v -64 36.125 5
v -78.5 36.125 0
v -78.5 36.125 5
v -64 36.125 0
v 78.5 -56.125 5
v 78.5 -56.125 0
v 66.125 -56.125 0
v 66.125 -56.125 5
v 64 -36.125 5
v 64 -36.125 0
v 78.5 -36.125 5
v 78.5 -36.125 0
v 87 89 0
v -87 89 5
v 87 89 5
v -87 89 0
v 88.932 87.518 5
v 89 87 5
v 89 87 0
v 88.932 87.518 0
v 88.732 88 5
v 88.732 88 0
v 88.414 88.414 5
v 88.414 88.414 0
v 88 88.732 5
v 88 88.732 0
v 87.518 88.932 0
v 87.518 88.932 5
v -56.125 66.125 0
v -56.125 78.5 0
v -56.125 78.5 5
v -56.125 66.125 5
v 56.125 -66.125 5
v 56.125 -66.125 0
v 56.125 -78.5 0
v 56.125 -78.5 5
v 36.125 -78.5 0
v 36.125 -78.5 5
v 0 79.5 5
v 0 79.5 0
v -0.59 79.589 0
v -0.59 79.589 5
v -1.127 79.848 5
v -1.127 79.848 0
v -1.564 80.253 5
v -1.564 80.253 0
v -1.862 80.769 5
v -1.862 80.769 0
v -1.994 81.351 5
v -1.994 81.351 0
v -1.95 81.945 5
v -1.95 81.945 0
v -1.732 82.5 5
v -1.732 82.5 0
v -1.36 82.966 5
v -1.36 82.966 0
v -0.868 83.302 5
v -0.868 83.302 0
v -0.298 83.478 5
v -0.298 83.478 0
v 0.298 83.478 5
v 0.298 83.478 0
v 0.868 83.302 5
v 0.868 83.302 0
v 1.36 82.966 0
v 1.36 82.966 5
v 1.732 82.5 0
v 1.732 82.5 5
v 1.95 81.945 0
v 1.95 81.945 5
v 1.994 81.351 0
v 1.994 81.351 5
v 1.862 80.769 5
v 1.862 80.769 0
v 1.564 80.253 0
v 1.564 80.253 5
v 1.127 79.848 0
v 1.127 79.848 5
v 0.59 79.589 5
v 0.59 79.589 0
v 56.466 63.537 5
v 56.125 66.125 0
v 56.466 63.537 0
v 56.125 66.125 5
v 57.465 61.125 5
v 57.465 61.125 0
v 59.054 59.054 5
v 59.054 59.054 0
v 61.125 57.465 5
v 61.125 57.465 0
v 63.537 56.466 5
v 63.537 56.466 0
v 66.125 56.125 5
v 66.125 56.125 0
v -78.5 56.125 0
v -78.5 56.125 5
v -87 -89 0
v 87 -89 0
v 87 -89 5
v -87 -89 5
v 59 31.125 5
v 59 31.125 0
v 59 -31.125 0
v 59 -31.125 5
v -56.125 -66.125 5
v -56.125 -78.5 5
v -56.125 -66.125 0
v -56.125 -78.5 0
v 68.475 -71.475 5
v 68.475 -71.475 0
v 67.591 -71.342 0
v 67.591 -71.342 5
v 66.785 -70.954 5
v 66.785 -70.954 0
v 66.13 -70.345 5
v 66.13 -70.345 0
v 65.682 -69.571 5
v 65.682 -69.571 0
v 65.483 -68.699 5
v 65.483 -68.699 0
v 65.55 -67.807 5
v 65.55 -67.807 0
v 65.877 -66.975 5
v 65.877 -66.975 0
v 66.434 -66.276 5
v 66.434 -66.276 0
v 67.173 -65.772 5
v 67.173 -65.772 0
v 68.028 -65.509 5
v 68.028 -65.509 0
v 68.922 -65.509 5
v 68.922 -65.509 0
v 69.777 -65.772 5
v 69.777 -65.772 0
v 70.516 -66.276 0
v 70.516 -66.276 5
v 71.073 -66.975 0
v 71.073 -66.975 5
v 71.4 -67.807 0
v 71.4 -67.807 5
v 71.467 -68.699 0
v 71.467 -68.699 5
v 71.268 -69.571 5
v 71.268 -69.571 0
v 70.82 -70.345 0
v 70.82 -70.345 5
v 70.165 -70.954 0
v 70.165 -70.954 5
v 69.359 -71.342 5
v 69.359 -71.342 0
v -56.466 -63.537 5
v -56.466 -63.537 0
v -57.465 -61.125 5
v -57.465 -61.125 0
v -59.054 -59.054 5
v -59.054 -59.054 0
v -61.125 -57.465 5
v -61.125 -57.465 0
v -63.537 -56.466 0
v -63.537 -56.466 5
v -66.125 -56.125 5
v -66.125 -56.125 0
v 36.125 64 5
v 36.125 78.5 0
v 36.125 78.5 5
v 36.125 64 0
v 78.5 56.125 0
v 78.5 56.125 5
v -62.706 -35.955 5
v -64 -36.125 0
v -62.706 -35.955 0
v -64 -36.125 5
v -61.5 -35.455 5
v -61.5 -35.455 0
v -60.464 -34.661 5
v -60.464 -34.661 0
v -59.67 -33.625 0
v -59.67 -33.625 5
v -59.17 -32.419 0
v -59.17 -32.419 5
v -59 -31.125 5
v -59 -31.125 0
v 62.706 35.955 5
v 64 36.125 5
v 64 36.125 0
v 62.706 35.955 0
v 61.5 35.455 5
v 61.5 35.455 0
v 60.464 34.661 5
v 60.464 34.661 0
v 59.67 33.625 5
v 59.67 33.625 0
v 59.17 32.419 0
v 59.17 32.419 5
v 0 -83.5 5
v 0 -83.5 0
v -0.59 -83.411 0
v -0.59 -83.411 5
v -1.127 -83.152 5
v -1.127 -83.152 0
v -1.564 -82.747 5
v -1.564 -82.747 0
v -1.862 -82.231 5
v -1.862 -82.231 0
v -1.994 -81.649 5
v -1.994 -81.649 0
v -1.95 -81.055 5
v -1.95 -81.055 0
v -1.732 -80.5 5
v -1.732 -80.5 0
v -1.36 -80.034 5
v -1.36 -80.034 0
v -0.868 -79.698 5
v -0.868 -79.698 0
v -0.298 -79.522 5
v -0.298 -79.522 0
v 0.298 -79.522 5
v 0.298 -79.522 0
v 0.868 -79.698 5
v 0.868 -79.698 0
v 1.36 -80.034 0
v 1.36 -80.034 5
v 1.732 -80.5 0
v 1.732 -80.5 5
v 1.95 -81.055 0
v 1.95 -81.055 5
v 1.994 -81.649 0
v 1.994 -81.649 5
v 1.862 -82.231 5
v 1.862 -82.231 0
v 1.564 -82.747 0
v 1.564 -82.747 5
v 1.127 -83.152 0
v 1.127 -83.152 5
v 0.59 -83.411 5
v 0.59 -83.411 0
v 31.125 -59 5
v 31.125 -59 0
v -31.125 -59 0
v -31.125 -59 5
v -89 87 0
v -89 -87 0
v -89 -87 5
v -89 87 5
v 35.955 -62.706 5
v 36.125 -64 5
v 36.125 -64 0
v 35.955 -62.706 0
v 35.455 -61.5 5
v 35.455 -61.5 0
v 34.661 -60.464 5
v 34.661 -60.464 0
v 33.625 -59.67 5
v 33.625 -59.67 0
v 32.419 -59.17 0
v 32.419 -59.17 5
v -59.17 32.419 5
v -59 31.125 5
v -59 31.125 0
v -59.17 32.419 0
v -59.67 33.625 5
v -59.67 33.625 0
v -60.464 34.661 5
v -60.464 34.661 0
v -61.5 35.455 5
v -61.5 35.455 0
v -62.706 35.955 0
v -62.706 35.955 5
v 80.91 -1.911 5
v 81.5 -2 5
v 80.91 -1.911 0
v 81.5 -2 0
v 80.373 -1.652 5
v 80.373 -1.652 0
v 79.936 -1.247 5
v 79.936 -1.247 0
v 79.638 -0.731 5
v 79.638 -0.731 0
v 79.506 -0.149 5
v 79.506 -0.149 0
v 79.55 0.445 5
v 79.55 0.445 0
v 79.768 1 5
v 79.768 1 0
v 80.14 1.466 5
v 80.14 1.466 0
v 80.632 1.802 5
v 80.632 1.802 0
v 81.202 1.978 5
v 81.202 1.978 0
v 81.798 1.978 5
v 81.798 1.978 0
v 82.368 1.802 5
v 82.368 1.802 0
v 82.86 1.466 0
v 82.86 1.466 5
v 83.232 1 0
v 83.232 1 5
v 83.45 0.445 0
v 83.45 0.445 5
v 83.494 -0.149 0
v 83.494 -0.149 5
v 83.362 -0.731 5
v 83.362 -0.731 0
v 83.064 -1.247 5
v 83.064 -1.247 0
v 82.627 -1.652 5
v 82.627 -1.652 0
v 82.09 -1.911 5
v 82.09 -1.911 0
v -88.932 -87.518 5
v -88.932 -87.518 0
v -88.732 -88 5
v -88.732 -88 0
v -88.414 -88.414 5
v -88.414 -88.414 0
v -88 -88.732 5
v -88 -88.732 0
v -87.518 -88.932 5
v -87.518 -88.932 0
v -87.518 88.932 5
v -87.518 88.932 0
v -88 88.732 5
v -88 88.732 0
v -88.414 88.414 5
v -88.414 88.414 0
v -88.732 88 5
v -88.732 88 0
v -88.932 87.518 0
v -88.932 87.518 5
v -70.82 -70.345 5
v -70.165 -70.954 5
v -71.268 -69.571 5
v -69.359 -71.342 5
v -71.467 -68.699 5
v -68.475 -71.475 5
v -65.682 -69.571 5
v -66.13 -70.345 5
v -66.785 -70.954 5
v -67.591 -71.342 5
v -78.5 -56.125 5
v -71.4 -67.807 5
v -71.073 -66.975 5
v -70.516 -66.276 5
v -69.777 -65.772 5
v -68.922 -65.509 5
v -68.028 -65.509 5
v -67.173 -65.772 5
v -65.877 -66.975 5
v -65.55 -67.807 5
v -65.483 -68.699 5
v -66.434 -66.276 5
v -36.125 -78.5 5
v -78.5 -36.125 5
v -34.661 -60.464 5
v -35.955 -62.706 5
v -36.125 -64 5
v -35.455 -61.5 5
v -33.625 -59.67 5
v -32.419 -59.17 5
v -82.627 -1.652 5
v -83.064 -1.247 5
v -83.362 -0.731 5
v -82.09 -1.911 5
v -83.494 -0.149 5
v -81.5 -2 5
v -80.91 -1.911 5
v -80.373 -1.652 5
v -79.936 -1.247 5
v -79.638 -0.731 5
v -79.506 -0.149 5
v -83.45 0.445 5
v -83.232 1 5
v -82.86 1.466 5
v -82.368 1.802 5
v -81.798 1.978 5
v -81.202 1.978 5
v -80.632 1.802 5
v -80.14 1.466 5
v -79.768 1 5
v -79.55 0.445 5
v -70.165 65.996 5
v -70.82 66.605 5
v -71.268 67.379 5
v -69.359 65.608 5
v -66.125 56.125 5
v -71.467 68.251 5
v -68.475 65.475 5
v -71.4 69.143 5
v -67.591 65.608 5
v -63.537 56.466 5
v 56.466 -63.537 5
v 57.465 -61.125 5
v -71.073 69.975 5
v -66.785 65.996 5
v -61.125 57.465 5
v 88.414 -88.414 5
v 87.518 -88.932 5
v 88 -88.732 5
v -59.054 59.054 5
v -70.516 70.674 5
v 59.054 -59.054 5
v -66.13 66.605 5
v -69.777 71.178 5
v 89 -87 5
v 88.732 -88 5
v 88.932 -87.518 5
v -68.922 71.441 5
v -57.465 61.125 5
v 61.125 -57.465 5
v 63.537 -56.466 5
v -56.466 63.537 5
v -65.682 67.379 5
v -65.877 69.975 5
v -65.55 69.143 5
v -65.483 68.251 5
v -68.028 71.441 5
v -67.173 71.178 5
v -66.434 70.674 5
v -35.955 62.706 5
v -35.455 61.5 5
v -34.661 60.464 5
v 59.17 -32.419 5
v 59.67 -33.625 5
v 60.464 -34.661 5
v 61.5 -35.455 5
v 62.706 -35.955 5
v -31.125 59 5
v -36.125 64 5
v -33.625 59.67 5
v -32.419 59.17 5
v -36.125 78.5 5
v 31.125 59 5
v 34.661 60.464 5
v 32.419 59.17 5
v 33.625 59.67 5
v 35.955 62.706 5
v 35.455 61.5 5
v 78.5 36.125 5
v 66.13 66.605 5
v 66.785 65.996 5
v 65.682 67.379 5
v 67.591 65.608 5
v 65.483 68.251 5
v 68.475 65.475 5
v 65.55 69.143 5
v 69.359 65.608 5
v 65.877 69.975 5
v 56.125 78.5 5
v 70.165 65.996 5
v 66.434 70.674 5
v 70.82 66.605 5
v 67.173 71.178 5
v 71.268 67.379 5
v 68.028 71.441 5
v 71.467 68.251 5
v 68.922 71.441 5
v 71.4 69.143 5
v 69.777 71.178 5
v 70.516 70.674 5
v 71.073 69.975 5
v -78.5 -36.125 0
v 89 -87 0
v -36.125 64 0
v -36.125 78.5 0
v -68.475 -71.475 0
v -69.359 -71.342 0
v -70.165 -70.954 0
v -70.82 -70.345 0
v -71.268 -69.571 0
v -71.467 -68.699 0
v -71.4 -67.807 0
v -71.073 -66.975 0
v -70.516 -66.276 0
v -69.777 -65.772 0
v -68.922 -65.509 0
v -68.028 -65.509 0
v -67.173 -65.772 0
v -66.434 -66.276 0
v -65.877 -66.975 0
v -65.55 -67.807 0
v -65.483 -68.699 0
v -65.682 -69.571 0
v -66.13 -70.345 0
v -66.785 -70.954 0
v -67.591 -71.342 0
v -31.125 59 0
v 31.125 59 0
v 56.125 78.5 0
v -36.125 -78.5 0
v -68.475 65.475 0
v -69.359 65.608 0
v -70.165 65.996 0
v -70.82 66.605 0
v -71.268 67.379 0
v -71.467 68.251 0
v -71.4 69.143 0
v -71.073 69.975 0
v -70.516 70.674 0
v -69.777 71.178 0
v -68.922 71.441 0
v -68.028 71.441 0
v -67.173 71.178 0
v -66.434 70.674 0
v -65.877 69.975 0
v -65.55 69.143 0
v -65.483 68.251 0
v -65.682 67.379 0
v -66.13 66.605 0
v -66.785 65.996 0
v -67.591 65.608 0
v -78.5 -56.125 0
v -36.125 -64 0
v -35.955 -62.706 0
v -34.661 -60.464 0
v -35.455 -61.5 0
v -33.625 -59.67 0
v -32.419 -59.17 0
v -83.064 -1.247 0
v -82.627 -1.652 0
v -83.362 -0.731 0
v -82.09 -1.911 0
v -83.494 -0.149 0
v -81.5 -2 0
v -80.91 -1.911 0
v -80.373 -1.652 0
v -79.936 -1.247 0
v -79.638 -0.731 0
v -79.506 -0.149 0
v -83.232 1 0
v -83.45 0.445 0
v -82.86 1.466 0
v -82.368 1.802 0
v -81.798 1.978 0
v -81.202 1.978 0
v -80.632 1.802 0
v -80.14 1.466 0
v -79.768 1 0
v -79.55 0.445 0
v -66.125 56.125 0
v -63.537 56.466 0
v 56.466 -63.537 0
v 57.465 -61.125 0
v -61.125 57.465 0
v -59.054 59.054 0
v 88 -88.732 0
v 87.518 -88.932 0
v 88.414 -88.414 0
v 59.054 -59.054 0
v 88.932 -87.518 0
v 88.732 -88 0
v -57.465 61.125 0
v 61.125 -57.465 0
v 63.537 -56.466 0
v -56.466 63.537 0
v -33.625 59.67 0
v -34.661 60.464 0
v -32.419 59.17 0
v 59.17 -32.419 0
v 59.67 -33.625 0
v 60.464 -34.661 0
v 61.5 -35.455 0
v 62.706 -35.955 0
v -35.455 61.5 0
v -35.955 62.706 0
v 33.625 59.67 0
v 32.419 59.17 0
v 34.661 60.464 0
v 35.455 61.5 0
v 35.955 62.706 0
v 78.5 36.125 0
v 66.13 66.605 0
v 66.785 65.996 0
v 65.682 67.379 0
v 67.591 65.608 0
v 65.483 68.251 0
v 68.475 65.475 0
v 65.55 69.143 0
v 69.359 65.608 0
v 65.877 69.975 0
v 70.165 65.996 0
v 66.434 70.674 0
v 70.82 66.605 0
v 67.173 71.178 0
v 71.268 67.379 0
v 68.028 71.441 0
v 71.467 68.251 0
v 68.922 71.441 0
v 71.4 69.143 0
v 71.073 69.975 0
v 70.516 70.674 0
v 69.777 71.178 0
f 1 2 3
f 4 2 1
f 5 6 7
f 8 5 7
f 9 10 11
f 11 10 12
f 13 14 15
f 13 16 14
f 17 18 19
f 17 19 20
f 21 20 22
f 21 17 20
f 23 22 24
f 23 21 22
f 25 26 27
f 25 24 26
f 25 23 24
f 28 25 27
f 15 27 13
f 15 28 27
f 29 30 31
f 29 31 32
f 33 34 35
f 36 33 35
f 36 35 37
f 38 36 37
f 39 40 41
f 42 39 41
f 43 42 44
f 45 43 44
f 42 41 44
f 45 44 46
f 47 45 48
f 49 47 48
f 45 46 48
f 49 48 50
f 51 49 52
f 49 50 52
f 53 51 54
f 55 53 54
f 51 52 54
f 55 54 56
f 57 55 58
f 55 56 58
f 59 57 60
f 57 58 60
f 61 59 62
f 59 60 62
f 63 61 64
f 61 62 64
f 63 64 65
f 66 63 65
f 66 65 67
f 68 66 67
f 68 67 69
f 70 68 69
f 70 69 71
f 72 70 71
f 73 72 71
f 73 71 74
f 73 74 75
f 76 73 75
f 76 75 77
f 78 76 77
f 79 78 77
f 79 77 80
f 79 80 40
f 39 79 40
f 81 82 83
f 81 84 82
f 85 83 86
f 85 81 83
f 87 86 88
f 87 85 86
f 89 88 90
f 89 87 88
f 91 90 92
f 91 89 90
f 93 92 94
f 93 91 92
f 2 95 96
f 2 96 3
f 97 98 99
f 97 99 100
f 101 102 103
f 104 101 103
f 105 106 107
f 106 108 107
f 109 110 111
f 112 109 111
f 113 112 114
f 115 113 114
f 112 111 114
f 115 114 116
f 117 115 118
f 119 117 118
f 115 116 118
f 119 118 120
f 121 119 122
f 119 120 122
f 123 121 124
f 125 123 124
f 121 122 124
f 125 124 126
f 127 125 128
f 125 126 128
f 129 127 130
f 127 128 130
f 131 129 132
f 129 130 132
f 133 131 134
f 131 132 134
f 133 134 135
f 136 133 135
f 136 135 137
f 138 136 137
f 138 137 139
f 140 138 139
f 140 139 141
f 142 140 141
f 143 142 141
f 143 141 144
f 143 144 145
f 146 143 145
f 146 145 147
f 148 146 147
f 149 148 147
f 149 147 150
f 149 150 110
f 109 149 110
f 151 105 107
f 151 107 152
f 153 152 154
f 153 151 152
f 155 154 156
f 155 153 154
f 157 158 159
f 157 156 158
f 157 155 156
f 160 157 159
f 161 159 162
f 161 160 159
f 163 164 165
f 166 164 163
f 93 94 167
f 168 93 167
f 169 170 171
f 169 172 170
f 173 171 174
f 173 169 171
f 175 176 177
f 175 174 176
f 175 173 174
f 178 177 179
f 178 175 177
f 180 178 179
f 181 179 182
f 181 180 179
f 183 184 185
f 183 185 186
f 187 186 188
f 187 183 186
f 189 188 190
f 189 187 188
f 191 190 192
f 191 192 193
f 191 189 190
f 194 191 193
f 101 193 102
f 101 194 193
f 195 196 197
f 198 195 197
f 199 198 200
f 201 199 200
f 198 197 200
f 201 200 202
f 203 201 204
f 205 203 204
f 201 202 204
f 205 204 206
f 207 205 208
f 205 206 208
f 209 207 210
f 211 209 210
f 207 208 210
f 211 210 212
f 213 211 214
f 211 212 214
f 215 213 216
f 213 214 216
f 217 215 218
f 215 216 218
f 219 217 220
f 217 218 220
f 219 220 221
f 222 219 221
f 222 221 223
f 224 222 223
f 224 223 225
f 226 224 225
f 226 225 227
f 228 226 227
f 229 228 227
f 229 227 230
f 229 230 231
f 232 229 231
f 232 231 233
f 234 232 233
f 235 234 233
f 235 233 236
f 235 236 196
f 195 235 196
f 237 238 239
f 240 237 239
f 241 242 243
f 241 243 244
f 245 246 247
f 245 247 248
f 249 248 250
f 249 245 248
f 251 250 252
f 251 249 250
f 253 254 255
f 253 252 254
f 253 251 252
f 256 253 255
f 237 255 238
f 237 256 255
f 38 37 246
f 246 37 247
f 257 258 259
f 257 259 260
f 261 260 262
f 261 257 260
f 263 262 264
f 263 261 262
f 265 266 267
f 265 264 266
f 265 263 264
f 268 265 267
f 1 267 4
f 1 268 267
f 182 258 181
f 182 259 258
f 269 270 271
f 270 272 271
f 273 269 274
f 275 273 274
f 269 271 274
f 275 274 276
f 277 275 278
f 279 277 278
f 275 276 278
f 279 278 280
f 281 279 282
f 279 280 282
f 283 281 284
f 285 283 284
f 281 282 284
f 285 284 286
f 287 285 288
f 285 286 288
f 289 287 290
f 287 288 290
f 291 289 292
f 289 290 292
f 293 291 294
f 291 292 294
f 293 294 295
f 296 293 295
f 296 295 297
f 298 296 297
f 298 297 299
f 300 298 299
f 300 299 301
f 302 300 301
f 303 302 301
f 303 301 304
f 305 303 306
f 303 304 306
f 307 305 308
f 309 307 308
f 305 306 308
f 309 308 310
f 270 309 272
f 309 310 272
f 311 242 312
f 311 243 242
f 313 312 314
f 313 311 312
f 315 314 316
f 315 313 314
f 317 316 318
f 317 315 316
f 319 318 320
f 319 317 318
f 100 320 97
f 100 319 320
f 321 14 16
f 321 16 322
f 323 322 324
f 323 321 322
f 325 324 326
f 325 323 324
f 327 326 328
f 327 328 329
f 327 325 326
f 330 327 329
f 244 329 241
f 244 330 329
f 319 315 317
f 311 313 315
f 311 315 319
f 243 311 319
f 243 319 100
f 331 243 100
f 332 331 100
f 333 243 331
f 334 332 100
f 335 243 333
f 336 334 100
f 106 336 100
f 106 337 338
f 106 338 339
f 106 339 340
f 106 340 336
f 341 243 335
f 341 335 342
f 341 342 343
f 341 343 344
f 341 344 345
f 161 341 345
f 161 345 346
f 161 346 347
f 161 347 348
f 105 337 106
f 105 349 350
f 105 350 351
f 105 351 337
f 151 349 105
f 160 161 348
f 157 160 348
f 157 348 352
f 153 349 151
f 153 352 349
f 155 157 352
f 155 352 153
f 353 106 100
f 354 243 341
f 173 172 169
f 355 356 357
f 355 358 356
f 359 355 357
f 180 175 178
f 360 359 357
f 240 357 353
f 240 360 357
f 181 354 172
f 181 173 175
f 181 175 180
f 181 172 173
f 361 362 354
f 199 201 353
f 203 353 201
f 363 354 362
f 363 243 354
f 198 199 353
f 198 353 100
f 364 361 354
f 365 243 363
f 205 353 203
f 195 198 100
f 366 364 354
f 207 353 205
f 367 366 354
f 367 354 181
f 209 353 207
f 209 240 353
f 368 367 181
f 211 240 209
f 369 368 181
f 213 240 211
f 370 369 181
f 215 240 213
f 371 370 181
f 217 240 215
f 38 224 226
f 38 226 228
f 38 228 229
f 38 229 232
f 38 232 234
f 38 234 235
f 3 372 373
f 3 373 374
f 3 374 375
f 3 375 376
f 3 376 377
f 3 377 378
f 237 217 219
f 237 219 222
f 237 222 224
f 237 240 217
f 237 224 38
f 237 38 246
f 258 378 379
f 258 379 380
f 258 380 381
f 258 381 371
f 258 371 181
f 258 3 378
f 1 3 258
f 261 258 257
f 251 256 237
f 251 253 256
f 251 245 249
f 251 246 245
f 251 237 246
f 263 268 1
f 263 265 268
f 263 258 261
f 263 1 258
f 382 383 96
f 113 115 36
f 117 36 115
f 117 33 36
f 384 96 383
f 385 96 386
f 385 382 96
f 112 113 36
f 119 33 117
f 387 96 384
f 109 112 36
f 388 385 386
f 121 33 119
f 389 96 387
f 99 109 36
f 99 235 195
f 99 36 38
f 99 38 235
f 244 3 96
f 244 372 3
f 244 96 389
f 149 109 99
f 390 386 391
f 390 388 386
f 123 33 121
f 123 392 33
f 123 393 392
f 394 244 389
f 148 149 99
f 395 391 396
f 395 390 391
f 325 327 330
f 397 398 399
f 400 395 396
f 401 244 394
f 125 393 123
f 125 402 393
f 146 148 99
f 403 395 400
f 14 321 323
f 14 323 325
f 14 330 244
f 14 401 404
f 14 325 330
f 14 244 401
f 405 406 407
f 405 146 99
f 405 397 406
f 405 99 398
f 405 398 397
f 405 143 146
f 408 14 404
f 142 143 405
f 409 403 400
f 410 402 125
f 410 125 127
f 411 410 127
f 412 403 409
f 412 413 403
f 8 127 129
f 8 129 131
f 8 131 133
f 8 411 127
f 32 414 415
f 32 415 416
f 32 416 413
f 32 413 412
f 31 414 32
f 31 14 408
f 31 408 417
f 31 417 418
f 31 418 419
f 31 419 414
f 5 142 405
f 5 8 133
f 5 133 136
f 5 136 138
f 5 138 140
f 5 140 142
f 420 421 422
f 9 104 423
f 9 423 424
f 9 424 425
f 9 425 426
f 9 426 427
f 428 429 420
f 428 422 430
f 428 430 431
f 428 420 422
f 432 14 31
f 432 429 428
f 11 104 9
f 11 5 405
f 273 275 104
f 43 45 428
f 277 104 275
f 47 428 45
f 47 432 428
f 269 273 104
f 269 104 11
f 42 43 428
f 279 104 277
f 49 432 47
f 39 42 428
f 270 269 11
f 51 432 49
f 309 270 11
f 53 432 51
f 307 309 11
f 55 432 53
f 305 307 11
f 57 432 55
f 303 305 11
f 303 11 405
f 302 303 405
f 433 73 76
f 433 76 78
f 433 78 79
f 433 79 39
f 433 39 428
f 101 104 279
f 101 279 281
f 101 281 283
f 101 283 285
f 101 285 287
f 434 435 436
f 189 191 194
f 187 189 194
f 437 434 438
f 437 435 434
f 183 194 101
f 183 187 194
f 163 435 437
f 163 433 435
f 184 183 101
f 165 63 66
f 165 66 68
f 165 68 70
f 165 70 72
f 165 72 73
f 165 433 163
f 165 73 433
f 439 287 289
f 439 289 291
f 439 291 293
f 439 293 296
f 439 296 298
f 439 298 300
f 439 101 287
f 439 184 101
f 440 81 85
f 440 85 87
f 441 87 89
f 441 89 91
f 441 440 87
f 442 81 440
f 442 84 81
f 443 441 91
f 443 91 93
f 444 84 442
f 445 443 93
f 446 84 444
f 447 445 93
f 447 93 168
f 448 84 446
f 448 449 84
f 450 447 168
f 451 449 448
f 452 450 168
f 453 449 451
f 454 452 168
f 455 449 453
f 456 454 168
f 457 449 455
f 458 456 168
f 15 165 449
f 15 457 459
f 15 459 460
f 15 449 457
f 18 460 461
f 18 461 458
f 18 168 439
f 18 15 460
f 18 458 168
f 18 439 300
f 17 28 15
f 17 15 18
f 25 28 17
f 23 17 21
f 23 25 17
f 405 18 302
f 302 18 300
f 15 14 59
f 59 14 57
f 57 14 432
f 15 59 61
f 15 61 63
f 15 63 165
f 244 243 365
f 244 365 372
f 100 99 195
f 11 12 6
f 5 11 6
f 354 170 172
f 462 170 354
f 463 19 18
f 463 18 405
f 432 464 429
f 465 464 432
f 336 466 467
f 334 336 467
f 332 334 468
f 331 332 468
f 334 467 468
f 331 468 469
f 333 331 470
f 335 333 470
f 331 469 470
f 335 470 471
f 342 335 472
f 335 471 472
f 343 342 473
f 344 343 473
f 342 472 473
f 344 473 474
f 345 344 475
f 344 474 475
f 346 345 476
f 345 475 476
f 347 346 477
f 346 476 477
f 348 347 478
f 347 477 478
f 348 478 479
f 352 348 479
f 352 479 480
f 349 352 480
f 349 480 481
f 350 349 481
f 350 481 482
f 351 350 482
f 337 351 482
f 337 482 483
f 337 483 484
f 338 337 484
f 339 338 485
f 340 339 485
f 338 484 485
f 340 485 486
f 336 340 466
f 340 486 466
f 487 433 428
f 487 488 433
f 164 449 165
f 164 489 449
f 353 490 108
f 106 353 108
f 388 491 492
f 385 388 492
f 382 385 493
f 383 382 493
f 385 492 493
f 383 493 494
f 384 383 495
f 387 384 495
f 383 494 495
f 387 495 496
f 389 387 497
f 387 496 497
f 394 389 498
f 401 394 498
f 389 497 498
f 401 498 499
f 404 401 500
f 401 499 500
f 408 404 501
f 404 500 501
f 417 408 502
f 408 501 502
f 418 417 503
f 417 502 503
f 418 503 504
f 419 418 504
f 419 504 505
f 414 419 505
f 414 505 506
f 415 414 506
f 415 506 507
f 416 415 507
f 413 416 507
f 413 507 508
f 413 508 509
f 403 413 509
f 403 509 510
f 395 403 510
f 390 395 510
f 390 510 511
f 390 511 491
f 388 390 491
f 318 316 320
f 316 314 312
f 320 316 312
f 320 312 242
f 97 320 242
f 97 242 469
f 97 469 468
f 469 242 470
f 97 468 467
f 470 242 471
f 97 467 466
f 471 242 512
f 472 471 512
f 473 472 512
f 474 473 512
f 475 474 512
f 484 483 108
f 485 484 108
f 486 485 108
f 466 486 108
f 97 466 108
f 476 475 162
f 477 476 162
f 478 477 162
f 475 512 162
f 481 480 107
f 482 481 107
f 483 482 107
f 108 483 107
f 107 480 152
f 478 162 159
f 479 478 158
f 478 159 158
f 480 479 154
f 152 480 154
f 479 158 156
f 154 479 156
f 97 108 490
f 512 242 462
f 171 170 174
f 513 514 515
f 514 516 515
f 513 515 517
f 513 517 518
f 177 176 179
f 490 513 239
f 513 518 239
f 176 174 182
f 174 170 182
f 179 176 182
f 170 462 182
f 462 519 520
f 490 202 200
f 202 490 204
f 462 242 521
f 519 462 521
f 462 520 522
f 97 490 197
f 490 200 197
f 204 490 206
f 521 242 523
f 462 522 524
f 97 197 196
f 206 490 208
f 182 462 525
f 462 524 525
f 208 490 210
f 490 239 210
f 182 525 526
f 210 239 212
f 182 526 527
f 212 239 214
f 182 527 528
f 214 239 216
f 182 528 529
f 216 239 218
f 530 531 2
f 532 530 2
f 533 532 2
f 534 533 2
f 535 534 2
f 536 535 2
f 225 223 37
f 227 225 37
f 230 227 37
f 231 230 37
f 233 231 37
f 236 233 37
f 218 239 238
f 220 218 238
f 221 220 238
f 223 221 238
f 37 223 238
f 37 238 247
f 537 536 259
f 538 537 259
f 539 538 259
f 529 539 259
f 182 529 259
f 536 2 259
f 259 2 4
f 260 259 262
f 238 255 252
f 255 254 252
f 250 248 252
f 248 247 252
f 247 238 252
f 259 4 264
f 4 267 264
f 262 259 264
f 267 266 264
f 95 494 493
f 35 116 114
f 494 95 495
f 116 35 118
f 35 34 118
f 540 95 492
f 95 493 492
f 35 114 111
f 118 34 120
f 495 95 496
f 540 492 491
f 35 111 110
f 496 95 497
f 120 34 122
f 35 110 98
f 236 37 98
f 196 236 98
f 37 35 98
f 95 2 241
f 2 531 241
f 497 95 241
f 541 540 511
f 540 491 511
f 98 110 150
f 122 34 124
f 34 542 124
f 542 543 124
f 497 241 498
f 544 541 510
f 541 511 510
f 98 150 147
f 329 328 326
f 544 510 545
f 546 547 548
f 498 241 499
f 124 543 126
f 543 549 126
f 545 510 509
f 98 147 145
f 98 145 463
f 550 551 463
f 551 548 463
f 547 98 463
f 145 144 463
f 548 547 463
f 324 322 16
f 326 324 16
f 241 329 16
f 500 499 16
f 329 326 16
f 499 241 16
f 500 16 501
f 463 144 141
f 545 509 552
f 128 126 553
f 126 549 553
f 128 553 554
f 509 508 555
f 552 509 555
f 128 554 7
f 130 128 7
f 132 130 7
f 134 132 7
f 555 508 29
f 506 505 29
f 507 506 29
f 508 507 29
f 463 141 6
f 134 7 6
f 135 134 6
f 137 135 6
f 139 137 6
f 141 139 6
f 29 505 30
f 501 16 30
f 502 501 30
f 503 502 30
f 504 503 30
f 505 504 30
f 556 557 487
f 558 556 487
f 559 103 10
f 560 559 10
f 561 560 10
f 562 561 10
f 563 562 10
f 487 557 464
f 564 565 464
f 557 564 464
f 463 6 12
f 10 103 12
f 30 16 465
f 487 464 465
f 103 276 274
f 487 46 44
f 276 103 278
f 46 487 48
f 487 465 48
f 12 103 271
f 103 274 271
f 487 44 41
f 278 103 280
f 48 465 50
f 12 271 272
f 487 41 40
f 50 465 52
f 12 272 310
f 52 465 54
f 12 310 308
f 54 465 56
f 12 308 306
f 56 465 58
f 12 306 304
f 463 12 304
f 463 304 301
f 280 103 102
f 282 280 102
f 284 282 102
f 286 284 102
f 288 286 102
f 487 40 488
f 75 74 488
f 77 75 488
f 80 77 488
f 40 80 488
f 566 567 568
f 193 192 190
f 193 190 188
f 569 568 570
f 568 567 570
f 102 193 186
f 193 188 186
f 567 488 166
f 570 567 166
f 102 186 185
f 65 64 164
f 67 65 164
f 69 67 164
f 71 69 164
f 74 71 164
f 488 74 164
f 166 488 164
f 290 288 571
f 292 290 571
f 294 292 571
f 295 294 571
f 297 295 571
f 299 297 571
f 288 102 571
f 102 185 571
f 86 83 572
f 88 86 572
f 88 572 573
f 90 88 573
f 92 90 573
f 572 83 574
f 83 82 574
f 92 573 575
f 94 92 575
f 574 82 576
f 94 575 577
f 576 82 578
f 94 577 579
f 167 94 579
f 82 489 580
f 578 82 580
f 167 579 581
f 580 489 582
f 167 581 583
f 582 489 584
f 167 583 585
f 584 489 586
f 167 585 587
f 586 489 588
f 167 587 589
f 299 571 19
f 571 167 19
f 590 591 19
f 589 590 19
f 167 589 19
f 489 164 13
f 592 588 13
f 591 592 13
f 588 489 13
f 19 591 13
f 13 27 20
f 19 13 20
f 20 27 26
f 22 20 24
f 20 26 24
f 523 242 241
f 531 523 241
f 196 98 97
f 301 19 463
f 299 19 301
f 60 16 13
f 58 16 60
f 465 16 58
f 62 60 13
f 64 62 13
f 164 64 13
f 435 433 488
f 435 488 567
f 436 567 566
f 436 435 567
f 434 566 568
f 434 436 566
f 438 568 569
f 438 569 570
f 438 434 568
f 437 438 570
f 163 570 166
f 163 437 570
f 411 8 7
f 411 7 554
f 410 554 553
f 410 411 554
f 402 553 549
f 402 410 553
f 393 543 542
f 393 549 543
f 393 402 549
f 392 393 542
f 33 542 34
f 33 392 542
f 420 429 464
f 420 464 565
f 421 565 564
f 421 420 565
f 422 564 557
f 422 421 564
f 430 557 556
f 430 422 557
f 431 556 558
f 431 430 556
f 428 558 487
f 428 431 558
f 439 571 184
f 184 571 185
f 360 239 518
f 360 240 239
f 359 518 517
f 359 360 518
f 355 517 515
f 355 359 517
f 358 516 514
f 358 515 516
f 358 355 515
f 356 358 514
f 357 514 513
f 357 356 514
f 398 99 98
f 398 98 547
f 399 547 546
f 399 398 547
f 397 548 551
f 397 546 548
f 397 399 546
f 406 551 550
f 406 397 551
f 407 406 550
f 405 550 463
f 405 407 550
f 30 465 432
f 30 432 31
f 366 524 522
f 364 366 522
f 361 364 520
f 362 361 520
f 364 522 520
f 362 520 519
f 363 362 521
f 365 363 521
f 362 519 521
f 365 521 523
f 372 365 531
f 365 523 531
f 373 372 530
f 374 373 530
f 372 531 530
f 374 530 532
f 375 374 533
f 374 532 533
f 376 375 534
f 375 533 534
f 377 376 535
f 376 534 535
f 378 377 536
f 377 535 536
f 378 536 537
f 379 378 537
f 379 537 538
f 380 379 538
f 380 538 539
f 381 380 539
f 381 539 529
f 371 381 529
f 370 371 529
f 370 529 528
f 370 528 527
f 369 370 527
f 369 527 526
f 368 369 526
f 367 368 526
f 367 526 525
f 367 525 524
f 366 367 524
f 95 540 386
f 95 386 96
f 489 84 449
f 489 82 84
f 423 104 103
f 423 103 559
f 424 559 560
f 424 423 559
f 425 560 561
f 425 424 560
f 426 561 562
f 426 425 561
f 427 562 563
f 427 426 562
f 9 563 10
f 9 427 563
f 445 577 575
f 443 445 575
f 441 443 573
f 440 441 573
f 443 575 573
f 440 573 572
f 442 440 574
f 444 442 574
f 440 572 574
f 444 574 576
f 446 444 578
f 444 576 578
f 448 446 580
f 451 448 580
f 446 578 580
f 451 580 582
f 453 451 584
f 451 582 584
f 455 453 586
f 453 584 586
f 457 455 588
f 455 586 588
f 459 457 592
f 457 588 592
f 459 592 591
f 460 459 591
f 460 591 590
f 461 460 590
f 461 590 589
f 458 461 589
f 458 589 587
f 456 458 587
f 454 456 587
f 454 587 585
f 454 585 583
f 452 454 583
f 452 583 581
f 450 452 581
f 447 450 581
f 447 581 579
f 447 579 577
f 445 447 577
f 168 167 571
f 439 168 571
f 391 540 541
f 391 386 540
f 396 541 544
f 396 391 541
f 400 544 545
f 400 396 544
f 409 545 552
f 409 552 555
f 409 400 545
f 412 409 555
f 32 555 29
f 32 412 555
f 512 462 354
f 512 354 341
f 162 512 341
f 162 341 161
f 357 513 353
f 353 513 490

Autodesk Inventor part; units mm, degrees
ref_plane "YZ Plane" through (0, 0, 0) normal (1, 0, 0) x (0, 1, 0)
ref_plane "XZ Plane" through (0, 0, 0) normal (0, 1, 0) x (-1, 0, 0)
ref_plane "XY Plane" through (0, 0, 0) normal (0, 0, 1) x (1, 0, 0)
sketch "Sketch1" plane through (0, 0, 0) normal (0, 0, 1) x (1, 0, 0)
  line L0 (-89, 89) -> (89, 89)
  line L1 (89, 89) -> (89, -89)
  line L2 (89, -89) -> (-89, -89)
  line L3 (-89, -89) -> (-89, 89)
  line L4 (-56.125, 56.125) -> (-78.5, 56.125)
  line L5 (-78.5, -56.125) -> (-56.125, -56.125)
  line L6 (56.125, 56.125) -> (56.125, 78.5)
  line L7 (-56.125, 78.5) -> (-56.125, 56.125)
  line L8 (56.125, 56.125) -> (78.5, 56.125)
  line L9 (78.5, -56.125) -> (56.125, -56.125)
  line L10 (56.125, -56.125) -> (56.125, -78.5)
  line L11 (-56.125, -78.5) -> (-56.125, -56.125)
  line L12 (-78.5, 36.125) -> (-59, 36.125)
  line L13 (-59, 36.125) -> (-59, -36.125)
  line L14 (-59, -36.125) -> (-78.5, -36.125)
  line L15 (-78.5, 56.125) -> (-78.5, 36.125)
  line L16 (-78.5, -36.125) -> (-78.5, -56.125)
  line L17 (78.5, 36.125) -> (59, 36.125)
  line L18 (59, 36.125) -> (59, -36.125)
  line L19 (59, -36.125) -> (78.5, -36.125)
  line L20 (78.5, 56.125) -> (78.5, 36.125)
  line L21 (78.5, -36.125) -> (78.5, -56.125)
  line L22 (36.125, 78.5) -> (36.125, 59)
  line L23 (36.125, 59) -> (-36.125, 59)
  line L24 (-36.125, 59) -> (-36.125, 78.5)
  line L25 (36.125, -78.5) -> (36.125, -59)
  line L26 (36.125, -59) -> (-36.125, -59)
  line L27 (-36.125, -59) -> (-36.125, -78.5)
  line L28 (56.125, 78.5) -> (36.125, 78.5)
  line L29 (-36.125, 78.5) -> (-56.125, 78.5)
  line L30 (56.125, -78.5) -> (36.125, -78.5)
  line L31 (-36.125, -78.5) -> (-56.125, -78.5)
  point P0 (0, 0)
  point P1 (-78.5, 0)
  dimension "d4" = 112.25
  dimension "d5" = 112.25
  dimension "d29" = 0
  dimension "d30" = 0
  dimension "d33" = 178
  dimension "d34" = 89
  dimension "d35" = 89
  dimension "d41" = 20
  dimension "d42" = 20
  dimension "d43" = 30
  dimension "d46" = 20
  dimension "d47" = 20
  dimension "d48" = 30
  dimension "d49" = 157
  dimension "d50" = 78.5
  dimension "d51" = 30
  dimension "d52" = 30
  dimension "d53" = 20
  dimension "d54" = 157
  dimension "d55" = 78.5
  dimension "d56" = 20
extrude "Extrusion1" add sketch "Sketch1" along normal blind 5
sketch "Sketch2" plane through (0, 0, 5) normal (0, 0, 1) x (1, 0, 0)
  circle A0 centre (-81.5, 0) radius 2
  circle A1 centre (81.5, 0) radius 2
  line L0 (-78.5, 36.125) -> (-78.5, 56.125) projected
  line L1 (78.5, 56.125) -> (78.5, 36.125) projected
  circle A2 centre (0, 81.5) radius 2
  circle A3 centre (0, -81.5) radius 2
  line L2 (36.125, 78.5) -> (56.125, 78.5) projected
  line L3 (56.125, -78.5) -> (36.125, -78.5) projected
  line L4 (-89, 89) -> (-89, -89) projected
  line L5 (89, 89) -> (-89, 89) projected
  line L6 (89, -89) -> (89, 89) projected
  line L7 (-89, -89) -> (89, -89) projected
  point P0 (0, 0)
  point P1 (-78.5, -56.125)
  point P2 (78.5, -56.125)
  point P3 (-56.125, 78.5)
  point P4 (-56.125, -78.5)
  dimension "d18" = 4
  dimension "d37" = 7.5
  dimension "d38" = 7.5
  dimension "d39" = 7.5
  dimension "d40" = 7.5
hole "Hole1" at (-81.5, 0, 5) at (0, 81.5, 5) at (81.5, 0, 5) at (0, -81.5, 5) direction (0, 0, -1) diameter 4 end through all
fillet "Fillet1" radius 2 4 edges at (-89, -89, 2.5) (-89, 89, 2.5) (89, -89, 2.5) (89, 89, 2.5)
sketch "Sketch3" plane through (0, 0, 5) normal (0, 0, 1) x (1, 0, 0)
  line L0 (68.475, -68.475) -> (-68.475, -68.475)
  line L1 (-68.475, -68.475) -> (-68.475, 68.475)
  line L2 (-68.475, 68.475) -> (68.475, 68.475)
  line L3 (68.475, 68.475) -> (68.475, -68.475)
  line L4 (68.475, -68.475) -> (-68.475, 68.475) construction
  line L5 (-68.475, -68.475) -> (68.475, 68.475) construction
  circle A0 centre (-68.475, 68.475) radius 4.875
  point P0 (0, 0)
  dimension "d31" = 136.95
  dimension "d32" = 9.75
fillet "Fillet2" radius 10 4 edges at (-56.125, 56.125, 2.5) (56.125, 56.125, 2.5) (56.125, -56.125, 2.5) (-56.125, -56.125, 2.5)
fillet "Fillet3" radius 5 8 edges at (-59, 36.125, 2.5) (-59, -36.125, 2.5) (-36.125, -59, 2.5) (36.125, -59, 2.5) (59, -36.125, 2.5) (59, 36.125, 2.5) (36.125, 59, 2.5) (-36.125, 59, 2.5)
hole "Hole2" at (-68.475, 68.475, 5) at (68.475, 68.475, 5) at (68.475, -68.475, 5) at (-68.475, -68.475, 5) direction (0, 0, -1) diameter 6 end through all
equation "\"d34\" = 0.5 * d33"
equation "\"d35\" = 0.5 * d33"
equation "\"d50\" = 0.5 * d49"
equation "\"d55\" = 0.5 * d54"
equation "\"d38\" = d37"
equation "\"d39\" = d37"
equation "\"d40\" = d37"
equation "\"d21\" = d18"
equation "\"d6\" = 0.5 * d3"
equation "\"d7\" = 0.5 * d2"
equation "\"d3\" = 157"
equation "\"d2\" = 157"
properties part number "WaagePlexiOben1" material "PET Plastic"
